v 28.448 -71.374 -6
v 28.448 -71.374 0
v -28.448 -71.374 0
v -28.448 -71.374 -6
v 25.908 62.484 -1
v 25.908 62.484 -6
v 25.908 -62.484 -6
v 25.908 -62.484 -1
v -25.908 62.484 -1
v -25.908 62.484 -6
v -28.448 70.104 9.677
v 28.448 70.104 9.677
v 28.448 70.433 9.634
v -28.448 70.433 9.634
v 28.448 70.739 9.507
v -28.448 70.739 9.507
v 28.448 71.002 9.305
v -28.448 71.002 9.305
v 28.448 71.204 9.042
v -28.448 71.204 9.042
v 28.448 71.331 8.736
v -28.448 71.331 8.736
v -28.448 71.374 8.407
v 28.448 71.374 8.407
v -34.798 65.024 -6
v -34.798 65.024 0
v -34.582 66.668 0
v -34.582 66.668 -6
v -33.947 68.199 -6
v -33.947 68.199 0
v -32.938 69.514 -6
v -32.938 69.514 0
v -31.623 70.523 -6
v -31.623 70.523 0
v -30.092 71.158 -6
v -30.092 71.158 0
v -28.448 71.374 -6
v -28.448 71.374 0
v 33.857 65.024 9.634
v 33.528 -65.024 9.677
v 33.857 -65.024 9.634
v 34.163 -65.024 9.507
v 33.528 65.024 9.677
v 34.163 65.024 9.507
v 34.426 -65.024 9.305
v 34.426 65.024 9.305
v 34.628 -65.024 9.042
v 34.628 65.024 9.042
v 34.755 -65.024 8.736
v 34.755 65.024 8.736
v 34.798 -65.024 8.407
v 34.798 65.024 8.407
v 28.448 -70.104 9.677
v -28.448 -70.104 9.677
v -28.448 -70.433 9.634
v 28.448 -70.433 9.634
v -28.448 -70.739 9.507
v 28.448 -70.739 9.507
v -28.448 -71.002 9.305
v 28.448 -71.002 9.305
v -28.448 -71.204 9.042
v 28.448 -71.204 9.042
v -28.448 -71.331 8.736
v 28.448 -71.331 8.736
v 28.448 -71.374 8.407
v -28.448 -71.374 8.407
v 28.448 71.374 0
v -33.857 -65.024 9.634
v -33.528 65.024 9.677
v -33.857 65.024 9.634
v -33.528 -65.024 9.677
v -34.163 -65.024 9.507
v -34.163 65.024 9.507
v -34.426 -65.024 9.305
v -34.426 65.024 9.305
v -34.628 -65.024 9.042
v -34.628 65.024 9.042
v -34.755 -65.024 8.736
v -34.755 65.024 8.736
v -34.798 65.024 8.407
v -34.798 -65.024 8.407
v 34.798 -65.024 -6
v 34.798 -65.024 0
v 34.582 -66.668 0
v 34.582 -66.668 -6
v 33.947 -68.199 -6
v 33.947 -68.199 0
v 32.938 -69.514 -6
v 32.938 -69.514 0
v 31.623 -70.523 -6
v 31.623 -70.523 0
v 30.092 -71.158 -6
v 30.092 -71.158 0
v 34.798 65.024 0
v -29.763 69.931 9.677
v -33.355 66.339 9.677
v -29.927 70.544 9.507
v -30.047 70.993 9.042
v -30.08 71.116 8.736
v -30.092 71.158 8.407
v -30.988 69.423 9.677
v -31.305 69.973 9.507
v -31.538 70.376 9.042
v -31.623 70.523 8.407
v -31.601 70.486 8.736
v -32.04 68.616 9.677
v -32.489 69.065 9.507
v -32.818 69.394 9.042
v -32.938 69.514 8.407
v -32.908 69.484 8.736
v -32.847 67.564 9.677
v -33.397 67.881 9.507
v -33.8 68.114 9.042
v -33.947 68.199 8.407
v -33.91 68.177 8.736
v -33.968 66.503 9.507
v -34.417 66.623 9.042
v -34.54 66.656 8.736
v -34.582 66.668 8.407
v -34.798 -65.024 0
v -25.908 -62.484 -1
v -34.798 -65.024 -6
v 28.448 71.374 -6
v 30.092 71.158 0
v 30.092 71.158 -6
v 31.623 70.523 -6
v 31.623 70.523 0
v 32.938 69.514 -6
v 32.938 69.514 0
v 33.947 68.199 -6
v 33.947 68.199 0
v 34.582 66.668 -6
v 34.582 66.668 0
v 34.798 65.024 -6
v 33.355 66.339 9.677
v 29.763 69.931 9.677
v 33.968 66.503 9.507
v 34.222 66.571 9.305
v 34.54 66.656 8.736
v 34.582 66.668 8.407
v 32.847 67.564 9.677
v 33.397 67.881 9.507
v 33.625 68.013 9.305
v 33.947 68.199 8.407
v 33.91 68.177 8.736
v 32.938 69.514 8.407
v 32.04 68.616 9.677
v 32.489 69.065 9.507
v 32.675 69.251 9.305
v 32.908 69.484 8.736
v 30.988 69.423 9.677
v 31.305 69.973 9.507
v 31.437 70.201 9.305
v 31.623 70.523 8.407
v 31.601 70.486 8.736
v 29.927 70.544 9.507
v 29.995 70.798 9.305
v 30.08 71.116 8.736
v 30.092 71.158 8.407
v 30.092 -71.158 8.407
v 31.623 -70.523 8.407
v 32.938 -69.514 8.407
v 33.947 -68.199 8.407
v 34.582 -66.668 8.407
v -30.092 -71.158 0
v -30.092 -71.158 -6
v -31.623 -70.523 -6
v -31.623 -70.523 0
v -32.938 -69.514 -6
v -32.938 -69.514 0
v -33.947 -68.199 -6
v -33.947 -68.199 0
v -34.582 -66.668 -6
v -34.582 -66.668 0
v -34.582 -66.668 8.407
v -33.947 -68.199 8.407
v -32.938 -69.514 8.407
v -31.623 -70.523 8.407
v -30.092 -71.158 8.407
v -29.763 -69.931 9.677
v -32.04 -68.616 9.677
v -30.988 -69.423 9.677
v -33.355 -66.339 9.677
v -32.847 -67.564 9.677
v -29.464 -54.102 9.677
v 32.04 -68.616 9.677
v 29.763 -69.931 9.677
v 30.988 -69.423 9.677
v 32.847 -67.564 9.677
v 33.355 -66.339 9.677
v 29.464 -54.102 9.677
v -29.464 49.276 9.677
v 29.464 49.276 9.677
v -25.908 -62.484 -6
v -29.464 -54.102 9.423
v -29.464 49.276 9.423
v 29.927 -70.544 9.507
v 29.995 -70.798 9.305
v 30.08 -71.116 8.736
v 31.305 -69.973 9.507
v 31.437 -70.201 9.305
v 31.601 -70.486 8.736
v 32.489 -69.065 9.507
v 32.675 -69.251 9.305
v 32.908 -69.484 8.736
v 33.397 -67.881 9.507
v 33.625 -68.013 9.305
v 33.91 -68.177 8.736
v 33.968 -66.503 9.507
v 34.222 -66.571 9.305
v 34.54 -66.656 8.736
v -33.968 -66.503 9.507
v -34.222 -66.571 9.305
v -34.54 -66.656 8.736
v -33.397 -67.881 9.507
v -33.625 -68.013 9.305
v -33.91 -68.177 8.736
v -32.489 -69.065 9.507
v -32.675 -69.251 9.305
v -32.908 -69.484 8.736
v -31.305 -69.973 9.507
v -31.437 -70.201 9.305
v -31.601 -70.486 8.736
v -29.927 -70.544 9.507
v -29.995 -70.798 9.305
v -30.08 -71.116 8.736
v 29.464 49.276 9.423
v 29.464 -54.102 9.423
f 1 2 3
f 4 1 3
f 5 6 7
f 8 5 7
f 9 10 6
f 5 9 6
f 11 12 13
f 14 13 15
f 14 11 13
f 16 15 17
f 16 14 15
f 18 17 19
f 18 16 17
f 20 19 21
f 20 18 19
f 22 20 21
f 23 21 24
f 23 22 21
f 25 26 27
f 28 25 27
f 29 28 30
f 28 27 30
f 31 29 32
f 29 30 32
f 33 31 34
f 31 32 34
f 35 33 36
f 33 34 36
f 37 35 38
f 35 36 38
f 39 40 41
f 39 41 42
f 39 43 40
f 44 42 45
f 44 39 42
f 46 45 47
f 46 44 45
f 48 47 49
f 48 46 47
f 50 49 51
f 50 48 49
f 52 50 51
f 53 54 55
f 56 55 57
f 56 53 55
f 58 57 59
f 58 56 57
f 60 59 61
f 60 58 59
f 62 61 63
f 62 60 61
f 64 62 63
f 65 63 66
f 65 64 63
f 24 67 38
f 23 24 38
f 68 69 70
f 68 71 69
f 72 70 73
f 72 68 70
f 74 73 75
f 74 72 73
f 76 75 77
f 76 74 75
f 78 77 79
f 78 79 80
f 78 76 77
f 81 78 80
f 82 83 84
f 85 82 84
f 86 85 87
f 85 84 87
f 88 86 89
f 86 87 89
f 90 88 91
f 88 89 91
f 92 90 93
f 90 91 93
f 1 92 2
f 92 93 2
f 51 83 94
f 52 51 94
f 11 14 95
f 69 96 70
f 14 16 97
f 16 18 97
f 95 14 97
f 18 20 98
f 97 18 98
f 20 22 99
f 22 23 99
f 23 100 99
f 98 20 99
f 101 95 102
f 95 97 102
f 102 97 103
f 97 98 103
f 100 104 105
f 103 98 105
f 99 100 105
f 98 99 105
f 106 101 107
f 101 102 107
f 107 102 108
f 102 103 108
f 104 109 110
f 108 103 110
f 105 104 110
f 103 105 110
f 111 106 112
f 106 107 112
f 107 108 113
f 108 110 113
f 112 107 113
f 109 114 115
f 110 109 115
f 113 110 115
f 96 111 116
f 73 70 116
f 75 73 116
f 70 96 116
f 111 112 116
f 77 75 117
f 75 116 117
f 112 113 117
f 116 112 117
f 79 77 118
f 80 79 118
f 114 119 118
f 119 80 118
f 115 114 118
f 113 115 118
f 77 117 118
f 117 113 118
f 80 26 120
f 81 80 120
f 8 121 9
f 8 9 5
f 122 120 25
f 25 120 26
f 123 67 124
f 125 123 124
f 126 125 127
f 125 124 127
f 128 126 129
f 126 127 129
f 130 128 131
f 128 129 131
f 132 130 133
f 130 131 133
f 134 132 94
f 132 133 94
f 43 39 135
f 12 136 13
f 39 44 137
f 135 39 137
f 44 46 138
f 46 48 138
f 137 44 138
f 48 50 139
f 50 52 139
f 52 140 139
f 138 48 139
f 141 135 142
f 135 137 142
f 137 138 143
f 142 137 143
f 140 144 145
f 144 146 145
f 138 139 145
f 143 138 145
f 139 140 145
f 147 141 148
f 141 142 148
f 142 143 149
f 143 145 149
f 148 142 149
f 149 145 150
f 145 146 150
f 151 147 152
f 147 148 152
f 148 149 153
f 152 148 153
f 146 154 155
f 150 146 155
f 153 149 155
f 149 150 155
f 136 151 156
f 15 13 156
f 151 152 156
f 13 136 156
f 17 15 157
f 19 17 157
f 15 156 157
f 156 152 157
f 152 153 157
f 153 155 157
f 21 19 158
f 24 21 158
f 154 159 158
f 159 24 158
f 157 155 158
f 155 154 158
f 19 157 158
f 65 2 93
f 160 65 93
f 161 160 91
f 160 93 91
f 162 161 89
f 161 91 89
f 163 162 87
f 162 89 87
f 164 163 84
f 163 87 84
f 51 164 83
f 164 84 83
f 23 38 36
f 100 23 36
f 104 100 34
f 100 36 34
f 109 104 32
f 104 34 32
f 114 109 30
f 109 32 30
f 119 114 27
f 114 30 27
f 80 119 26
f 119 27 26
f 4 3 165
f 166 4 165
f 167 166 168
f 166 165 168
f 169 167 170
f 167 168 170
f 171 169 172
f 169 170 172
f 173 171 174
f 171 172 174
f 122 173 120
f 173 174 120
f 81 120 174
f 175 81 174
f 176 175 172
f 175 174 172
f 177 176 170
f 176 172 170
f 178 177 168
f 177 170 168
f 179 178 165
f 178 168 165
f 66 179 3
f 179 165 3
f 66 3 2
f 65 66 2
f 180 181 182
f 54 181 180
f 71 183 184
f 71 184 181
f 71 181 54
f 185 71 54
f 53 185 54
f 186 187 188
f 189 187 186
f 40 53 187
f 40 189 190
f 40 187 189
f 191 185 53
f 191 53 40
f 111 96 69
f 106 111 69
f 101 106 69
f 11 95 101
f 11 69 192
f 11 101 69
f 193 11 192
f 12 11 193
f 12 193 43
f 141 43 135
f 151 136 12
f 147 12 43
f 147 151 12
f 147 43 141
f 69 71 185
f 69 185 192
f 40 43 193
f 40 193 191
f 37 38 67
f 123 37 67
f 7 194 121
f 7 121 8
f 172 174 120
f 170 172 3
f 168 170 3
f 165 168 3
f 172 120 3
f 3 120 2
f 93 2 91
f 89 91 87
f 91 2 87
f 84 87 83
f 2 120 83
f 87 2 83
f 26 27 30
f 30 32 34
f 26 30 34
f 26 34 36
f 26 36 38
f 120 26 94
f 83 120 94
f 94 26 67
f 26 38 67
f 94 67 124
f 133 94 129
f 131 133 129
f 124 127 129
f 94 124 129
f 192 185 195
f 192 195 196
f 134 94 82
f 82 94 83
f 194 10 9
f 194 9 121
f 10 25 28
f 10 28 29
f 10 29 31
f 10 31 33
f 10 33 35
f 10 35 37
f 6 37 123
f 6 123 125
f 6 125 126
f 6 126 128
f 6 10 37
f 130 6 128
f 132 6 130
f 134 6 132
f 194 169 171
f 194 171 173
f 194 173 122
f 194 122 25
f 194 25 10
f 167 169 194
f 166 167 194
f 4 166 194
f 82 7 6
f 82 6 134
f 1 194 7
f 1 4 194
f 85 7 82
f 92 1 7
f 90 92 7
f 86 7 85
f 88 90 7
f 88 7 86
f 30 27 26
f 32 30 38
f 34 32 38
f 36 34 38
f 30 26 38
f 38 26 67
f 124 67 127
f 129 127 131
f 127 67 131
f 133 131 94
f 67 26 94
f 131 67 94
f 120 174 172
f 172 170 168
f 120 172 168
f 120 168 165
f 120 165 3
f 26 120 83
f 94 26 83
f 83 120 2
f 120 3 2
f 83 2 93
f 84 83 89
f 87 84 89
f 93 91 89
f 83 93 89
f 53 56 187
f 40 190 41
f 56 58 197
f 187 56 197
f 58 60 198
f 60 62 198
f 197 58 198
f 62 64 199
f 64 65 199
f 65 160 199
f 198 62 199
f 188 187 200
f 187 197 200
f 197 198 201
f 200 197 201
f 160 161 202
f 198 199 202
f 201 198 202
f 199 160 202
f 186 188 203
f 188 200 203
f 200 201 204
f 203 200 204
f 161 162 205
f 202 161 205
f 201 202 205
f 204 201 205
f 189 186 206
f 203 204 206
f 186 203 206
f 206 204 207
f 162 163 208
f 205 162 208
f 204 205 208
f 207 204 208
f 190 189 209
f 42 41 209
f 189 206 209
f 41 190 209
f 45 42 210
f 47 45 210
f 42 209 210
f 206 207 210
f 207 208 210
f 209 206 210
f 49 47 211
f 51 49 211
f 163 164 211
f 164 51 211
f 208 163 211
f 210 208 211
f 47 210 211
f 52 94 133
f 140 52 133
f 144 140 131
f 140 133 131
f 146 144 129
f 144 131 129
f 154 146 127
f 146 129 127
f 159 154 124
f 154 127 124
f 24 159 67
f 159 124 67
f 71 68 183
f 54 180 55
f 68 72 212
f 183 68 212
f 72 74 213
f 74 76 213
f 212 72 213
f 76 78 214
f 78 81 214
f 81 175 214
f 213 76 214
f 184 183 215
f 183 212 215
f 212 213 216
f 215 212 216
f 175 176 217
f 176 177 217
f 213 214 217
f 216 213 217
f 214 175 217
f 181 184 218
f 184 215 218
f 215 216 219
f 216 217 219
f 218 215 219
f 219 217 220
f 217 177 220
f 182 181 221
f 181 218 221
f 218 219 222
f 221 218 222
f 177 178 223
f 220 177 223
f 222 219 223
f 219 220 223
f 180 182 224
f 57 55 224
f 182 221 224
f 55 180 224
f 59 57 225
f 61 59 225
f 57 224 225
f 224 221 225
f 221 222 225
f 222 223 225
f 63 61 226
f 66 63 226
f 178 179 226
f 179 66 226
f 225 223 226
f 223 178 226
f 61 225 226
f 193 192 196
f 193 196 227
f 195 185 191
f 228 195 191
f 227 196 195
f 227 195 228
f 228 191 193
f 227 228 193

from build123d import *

# Parameters (mm, degrees)
F1_DEPTH = 9.6774
F2_W     = 58.928
F2_H     = 103.378
F3_DEPTH = 0.254
F5_DEPTH = 6
F6_R     = 1.27
F7_W     = 51.816
F7_H     = 124.968
F8_DEPTH = 5


with BuildPart() as f1:
    # F0 (on Top) → F1 (new body)
    with BuildSketch(Plane.XY):
        with BuildLine():
            ThreePointArc((34.798, 65.024), (32.938128, 69.514128), (28.448, 71.374))
            Line((28.448, 71.374), (-28.448, 71.374))
            ThreePointArc((-28.448, 71.374), (-32.938128, 69.514128), (-34.798, 65.024))
            Line((-34.798, 65.024), (-34.798, -65.024))
            ThreePointArc((-34.798, -65.024), (-32.938128, -69.514128), (-28.448, -71.374))
            Line((-28.448, -71.374), (28.448, -71.374))
            ThreePointArc((28.448, -71.374), (32.938128, -69.514128), (34.798, -65.024))
            Line((34.798, -65.024), (34.798, 65.024))
        make_face()
    extrude(amount=F1_DEPTH)

    # F2 (on face) → F3 (cut)
    with BuildSketch(Plane.XY.offset(9.6774)):
        with Locations((0, -2.413)):
            Rectangle(F2_W, F2_H)
    extrude(amount=-F3_DEPTH, mode=Mode.SUBTRACT)

    # F6
    f6_edges = [f1.edges().sort_by_distance(p)[0] for p in [
        (-34.798, 0, 9.6774),
    ]]
    fillet(f6_edges, radius=F6_R)


with BuildPart() as f5:
    # F4 (on face) → F5 (new body)
    with BuildSketch(Plane(origin=(0, 0, 0), x_dir=(1, 0, 0), z_dir=(0, 0, -1))):
        with BuildLine():
            ThreePointArc((34.798, 65.024), (32.938128, 69.514128), (28.448, 71.374))
            Line((28.448, 71.374), (-28.448, 71.374))
            ThreePointArc((-28.448, 71.374), (-32.938128, 69.514128), (-34.798, 65.024))
            Line((-34.798, 65.024), (-34.798, -65.024))
            ThreePointArc((-34.798, -65.024), (-32.938128, -69.514128), (-28.448, -71.374))
            Line((-28.448, -71.374), (28.448, -71.374))
            ThreePointArc((28.448, -71.374), (32.938128, -69.514128), (34.798, -65.024))
            Line((34.798, -65.024), (34.798, 65.024))
        make_face()
    extrude(amount=F5_DEPTH)

    # F7 (on face) → F8 (cut)
    with BuildSketch(Plane(origin=(0, 0, -6), x_dir=(1, 0, 0), z_dir=(0, 0, -1))):
        Rectangle(F7_W, F7_H)
    extrude(amount=-F8_DEPTH, mode=Mode.SUBTRACT)


solid = Compound([f1.part, f5.part])
